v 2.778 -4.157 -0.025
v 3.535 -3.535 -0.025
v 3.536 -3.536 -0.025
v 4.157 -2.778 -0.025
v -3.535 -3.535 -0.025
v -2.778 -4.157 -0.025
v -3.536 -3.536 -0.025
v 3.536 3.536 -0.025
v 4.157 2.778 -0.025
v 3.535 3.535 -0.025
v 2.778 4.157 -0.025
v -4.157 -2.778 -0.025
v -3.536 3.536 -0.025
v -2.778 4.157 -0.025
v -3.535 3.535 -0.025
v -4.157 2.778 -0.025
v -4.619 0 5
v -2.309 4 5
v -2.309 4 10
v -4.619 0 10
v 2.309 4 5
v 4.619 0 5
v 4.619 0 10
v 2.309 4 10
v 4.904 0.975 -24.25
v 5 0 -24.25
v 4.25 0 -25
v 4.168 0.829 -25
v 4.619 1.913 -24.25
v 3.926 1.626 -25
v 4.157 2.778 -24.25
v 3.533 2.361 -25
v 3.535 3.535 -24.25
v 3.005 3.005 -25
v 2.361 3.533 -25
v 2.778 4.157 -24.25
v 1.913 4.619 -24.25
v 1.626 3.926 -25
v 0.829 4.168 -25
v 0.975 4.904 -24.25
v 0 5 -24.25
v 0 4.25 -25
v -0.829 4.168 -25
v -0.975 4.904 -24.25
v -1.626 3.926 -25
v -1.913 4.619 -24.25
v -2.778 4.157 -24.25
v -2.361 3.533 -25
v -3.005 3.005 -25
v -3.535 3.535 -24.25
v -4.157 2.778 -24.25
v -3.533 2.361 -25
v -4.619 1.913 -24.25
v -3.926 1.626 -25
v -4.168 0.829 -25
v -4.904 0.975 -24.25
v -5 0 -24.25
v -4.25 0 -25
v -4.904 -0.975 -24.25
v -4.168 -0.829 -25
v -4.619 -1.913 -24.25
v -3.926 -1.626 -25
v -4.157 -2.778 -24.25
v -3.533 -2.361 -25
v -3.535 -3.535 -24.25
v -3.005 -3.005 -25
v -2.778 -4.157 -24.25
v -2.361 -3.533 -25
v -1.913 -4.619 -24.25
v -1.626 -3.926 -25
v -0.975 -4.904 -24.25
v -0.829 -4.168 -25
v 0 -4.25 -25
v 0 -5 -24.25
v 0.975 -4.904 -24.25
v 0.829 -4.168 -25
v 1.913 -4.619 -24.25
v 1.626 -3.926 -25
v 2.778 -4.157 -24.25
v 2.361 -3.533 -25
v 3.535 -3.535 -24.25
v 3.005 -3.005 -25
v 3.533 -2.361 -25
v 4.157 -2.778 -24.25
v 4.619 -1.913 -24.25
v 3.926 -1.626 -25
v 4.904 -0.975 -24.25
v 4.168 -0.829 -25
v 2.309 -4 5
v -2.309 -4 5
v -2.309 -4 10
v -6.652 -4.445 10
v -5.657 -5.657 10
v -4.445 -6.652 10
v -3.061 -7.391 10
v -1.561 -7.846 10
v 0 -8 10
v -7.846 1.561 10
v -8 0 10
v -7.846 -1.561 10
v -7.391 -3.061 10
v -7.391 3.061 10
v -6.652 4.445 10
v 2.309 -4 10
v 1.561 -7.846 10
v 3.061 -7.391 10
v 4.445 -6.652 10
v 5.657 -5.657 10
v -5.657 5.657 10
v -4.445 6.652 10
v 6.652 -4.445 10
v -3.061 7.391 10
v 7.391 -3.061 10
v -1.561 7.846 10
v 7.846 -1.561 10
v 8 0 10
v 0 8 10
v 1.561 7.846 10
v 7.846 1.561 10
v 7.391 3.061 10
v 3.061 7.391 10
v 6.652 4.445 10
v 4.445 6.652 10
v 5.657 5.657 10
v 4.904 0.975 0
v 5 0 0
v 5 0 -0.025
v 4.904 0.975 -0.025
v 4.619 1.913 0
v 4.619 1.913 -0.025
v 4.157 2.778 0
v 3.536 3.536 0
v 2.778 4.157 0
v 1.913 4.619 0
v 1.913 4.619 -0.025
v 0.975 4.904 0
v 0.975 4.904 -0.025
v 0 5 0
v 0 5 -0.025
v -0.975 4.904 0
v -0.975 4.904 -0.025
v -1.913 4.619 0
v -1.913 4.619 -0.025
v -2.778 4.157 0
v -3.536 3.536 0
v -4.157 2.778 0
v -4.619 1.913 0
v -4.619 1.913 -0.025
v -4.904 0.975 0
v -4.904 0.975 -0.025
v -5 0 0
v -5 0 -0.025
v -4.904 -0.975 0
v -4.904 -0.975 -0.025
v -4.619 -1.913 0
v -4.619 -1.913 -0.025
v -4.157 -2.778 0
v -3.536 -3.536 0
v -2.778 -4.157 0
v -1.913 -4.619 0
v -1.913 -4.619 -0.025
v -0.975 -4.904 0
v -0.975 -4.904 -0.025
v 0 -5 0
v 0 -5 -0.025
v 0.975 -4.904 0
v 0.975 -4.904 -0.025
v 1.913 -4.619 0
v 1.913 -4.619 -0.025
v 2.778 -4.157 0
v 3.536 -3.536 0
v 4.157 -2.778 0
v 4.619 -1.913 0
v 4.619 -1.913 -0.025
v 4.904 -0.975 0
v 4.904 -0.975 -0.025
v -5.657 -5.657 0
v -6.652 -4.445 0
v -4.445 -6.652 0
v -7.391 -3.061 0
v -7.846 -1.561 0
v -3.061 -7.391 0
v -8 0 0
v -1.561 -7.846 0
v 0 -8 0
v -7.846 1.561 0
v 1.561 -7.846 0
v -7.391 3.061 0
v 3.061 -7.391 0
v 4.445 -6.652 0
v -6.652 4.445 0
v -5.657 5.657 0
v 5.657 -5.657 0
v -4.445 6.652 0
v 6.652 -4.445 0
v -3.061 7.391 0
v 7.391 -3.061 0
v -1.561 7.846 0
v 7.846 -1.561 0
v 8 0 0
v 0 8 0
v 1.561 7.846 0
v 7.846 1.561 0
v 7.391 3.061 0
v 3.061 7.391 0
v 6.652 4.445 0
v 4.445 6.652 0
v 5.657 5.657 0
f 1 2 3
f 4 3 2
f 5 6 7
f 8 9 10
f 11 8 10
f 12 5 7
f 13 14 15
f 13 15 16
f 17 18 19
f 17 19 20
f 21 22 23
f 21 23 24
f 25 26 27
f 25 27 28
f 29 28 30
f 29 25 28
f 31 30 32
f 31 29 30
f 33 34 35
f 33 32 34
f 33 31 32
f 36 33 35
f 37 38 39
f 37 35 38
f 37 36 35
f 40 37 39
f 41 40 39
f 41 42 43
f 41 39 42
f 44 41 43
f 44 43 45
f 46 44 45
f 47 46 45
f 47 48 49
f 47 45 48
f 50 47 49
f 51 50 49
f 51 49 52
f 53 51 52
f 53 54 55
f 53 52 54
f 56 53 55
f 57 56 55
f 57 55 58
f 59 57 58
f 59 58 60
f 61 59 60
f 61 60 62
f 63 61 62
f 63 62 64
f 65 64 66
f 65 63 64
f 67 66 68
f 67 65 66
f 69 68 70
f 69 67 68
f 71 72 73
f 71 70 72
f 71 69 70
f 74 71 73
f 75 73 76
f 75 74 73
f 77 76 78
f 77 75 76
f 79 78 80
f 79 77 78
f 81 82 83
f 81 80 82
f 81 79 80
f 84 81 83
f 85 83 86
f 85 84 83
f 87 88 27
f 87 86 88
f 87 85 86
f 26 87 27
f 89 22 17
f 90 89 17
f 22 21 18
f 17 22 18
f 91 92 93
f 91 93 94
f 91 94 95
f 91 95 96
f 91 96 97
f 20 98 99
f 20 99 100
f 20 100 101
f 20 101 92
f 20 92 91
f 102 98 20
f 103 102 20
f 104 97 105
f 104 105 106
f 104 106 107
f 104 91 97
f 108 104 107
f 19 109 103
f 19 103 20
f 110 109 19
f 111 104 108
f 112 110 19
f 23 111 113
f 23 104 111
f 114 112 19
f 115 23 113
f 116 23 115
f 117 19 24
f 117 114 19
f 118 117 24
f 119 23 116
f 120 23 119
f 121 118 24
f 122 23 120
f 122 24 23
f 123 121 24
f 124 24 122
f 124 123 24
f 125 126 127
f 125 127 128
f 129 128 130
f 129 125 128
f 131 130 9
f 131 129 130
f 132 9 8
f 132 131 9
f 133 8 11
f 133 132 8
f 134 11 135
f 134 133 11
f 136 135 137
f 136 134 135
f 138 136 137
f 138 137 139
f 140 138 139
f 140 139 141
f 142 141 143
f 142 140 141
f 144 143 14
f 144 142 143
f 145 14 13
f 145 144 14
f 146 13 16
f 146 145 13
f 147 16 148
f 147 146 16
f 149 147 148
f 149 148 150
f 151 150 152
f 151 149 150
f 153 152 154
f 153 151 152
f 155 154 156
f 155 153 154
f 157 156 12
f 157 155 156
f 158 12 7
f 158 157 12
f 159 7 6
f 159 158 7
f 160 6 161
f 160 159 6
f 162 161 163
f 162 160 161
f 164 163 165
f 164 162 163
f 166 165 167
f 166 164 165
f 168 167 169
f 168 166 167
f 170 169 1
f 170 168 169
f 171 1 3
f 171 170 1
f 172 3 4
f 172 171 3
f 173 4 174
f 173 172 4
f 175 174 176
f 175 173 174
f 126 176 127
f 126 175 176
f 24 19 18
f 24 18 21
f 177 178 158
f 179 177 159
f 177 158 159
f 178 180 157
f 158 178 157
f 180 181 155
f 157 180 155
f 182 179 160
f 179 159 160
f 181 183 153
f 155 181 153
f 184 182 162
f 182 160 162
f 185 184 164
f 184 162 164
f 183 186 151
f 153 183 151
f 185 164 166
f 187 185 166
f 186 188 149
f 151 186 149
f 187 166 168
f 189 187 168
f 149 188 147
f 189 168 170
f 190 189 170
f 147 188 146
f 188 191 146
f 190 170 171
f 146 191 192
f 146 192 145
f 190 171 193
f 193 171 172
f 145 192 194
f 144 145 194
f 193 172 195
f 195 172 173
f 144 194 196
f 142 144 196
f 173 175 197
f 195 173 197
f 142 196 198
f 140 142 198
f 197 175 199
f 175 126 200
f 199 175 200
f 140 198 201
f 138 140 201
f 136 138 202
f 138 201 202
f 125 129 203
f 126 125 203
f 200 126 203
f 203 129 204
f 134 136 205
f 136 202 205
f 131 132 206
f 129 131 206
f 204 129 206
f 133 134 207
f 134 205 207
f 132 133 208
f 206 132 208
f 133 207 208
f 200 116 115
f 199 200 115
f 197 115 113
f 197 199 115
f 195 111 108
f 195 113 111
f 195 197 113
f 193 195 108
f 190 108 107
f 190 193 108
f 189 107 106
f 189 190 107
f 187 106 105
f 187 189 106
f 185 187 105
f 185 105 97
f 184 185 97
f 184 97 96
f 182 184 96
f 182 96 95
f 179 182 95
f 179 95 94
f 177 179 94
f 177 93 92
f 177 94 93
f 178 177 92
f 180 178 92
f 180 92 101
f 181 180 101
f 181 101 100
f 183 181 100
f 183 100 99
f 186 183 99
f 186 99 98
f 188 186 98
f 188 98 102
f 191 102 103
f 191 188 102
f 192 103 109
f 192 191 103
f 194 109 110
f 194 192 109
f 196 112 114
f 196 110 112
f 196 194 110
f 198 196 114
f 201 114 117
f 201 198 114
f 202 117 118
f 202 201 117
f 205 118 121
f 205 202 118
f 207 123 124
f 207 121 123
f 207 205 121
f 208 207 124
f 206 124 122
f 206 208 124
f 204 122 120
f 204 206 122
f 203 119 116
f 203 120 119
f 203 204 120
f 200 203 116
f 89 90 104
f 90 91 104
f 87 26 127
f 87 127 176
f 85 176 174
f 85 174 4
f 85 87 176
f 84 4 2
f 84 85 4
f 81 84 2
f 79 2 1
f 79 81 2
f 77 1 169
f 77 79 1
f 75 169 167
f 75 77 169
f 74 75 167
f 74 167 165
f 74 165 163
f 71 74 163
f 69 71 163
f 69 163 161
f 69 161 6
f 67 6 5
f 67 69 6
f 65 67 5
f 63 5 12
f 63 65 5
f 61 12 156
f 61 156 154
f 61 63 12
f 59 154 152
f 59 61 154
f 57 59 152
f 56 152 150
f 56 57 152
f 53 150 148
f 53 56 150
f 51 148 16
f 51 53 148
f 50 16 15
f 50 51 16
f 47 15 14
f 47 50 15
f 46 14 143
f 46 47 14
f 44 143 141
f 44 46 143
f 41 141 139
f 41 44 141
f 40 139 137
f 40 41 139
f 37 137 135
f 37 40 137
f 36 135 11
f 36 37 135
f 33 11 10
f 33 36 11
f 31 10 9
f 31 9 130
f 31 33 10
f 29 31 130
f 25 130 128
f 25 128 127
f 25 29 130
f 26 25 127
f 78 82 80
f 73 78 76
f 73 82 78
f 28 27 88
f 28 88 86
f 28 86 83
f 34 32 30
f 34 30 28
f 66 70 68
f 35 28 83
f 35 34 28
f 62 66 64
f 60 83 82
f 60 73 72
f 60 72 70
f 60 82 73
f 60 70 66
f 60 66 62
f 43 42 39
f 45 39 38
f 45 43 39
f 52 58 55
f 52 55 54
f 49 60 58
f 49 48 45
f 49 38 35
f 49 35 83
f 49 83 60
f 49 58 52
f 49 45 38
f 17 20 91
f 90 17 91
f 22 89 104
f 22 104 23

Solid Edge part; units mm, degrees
sketch "Sketch1" plane through (0, 0, 0) normal (0, 0, 1) x (1, 0, 0)
  circle A0 centre (0, 0) radius 8
  dimension "D1" = 16
extrude "Protrusion1" add sketch "Sketch1" along normal blind 10
sketch "Sketch2" plane through (0, 0, 0) normal (0, 0, -1) x (1, 0, 0)
  circle A0 centre (0, 0) radius 5
extrude "Protrusion2" add sketch "Sketch2" along normal blind 25
sketch "Sketch3" plane through (0, 0, -25) normal (0, 0, -1) x (1, 0, 0)
  circle A0 centre (0, 0) radius 4.9997
extrude "Cutout1" cut sketch "Sketch3" against normal blind 24.975 flip side to cut
chamfer "Chamfer_1" distance 0.75 angle 45 1 edges at (-4.9997, 0, -25)
sketch "Sketch4" plane through (0, 0, 10) normal (0, 0, 1) x (1, 0, 0)
  line L0 (-2.3094, 4) -> (2.3094, 4)
  line L1 (4.6188, 0) -> (2.3094, 4)
  line L2 (2.3094, -4) -> (4.6188, 0)
  line L3 (-2.3094, -4) -> (2.3094, -4)
  line L4 (-4.6188, 0) -> (-2.3094, -4)
  line L5 (-2.3094, 4) -> (-4.6188, 0)
  dimension "D1" = 8
extrude "Cutout2" cut sketch "Sketch4" against normal blind 5
properties part number "24102802"
